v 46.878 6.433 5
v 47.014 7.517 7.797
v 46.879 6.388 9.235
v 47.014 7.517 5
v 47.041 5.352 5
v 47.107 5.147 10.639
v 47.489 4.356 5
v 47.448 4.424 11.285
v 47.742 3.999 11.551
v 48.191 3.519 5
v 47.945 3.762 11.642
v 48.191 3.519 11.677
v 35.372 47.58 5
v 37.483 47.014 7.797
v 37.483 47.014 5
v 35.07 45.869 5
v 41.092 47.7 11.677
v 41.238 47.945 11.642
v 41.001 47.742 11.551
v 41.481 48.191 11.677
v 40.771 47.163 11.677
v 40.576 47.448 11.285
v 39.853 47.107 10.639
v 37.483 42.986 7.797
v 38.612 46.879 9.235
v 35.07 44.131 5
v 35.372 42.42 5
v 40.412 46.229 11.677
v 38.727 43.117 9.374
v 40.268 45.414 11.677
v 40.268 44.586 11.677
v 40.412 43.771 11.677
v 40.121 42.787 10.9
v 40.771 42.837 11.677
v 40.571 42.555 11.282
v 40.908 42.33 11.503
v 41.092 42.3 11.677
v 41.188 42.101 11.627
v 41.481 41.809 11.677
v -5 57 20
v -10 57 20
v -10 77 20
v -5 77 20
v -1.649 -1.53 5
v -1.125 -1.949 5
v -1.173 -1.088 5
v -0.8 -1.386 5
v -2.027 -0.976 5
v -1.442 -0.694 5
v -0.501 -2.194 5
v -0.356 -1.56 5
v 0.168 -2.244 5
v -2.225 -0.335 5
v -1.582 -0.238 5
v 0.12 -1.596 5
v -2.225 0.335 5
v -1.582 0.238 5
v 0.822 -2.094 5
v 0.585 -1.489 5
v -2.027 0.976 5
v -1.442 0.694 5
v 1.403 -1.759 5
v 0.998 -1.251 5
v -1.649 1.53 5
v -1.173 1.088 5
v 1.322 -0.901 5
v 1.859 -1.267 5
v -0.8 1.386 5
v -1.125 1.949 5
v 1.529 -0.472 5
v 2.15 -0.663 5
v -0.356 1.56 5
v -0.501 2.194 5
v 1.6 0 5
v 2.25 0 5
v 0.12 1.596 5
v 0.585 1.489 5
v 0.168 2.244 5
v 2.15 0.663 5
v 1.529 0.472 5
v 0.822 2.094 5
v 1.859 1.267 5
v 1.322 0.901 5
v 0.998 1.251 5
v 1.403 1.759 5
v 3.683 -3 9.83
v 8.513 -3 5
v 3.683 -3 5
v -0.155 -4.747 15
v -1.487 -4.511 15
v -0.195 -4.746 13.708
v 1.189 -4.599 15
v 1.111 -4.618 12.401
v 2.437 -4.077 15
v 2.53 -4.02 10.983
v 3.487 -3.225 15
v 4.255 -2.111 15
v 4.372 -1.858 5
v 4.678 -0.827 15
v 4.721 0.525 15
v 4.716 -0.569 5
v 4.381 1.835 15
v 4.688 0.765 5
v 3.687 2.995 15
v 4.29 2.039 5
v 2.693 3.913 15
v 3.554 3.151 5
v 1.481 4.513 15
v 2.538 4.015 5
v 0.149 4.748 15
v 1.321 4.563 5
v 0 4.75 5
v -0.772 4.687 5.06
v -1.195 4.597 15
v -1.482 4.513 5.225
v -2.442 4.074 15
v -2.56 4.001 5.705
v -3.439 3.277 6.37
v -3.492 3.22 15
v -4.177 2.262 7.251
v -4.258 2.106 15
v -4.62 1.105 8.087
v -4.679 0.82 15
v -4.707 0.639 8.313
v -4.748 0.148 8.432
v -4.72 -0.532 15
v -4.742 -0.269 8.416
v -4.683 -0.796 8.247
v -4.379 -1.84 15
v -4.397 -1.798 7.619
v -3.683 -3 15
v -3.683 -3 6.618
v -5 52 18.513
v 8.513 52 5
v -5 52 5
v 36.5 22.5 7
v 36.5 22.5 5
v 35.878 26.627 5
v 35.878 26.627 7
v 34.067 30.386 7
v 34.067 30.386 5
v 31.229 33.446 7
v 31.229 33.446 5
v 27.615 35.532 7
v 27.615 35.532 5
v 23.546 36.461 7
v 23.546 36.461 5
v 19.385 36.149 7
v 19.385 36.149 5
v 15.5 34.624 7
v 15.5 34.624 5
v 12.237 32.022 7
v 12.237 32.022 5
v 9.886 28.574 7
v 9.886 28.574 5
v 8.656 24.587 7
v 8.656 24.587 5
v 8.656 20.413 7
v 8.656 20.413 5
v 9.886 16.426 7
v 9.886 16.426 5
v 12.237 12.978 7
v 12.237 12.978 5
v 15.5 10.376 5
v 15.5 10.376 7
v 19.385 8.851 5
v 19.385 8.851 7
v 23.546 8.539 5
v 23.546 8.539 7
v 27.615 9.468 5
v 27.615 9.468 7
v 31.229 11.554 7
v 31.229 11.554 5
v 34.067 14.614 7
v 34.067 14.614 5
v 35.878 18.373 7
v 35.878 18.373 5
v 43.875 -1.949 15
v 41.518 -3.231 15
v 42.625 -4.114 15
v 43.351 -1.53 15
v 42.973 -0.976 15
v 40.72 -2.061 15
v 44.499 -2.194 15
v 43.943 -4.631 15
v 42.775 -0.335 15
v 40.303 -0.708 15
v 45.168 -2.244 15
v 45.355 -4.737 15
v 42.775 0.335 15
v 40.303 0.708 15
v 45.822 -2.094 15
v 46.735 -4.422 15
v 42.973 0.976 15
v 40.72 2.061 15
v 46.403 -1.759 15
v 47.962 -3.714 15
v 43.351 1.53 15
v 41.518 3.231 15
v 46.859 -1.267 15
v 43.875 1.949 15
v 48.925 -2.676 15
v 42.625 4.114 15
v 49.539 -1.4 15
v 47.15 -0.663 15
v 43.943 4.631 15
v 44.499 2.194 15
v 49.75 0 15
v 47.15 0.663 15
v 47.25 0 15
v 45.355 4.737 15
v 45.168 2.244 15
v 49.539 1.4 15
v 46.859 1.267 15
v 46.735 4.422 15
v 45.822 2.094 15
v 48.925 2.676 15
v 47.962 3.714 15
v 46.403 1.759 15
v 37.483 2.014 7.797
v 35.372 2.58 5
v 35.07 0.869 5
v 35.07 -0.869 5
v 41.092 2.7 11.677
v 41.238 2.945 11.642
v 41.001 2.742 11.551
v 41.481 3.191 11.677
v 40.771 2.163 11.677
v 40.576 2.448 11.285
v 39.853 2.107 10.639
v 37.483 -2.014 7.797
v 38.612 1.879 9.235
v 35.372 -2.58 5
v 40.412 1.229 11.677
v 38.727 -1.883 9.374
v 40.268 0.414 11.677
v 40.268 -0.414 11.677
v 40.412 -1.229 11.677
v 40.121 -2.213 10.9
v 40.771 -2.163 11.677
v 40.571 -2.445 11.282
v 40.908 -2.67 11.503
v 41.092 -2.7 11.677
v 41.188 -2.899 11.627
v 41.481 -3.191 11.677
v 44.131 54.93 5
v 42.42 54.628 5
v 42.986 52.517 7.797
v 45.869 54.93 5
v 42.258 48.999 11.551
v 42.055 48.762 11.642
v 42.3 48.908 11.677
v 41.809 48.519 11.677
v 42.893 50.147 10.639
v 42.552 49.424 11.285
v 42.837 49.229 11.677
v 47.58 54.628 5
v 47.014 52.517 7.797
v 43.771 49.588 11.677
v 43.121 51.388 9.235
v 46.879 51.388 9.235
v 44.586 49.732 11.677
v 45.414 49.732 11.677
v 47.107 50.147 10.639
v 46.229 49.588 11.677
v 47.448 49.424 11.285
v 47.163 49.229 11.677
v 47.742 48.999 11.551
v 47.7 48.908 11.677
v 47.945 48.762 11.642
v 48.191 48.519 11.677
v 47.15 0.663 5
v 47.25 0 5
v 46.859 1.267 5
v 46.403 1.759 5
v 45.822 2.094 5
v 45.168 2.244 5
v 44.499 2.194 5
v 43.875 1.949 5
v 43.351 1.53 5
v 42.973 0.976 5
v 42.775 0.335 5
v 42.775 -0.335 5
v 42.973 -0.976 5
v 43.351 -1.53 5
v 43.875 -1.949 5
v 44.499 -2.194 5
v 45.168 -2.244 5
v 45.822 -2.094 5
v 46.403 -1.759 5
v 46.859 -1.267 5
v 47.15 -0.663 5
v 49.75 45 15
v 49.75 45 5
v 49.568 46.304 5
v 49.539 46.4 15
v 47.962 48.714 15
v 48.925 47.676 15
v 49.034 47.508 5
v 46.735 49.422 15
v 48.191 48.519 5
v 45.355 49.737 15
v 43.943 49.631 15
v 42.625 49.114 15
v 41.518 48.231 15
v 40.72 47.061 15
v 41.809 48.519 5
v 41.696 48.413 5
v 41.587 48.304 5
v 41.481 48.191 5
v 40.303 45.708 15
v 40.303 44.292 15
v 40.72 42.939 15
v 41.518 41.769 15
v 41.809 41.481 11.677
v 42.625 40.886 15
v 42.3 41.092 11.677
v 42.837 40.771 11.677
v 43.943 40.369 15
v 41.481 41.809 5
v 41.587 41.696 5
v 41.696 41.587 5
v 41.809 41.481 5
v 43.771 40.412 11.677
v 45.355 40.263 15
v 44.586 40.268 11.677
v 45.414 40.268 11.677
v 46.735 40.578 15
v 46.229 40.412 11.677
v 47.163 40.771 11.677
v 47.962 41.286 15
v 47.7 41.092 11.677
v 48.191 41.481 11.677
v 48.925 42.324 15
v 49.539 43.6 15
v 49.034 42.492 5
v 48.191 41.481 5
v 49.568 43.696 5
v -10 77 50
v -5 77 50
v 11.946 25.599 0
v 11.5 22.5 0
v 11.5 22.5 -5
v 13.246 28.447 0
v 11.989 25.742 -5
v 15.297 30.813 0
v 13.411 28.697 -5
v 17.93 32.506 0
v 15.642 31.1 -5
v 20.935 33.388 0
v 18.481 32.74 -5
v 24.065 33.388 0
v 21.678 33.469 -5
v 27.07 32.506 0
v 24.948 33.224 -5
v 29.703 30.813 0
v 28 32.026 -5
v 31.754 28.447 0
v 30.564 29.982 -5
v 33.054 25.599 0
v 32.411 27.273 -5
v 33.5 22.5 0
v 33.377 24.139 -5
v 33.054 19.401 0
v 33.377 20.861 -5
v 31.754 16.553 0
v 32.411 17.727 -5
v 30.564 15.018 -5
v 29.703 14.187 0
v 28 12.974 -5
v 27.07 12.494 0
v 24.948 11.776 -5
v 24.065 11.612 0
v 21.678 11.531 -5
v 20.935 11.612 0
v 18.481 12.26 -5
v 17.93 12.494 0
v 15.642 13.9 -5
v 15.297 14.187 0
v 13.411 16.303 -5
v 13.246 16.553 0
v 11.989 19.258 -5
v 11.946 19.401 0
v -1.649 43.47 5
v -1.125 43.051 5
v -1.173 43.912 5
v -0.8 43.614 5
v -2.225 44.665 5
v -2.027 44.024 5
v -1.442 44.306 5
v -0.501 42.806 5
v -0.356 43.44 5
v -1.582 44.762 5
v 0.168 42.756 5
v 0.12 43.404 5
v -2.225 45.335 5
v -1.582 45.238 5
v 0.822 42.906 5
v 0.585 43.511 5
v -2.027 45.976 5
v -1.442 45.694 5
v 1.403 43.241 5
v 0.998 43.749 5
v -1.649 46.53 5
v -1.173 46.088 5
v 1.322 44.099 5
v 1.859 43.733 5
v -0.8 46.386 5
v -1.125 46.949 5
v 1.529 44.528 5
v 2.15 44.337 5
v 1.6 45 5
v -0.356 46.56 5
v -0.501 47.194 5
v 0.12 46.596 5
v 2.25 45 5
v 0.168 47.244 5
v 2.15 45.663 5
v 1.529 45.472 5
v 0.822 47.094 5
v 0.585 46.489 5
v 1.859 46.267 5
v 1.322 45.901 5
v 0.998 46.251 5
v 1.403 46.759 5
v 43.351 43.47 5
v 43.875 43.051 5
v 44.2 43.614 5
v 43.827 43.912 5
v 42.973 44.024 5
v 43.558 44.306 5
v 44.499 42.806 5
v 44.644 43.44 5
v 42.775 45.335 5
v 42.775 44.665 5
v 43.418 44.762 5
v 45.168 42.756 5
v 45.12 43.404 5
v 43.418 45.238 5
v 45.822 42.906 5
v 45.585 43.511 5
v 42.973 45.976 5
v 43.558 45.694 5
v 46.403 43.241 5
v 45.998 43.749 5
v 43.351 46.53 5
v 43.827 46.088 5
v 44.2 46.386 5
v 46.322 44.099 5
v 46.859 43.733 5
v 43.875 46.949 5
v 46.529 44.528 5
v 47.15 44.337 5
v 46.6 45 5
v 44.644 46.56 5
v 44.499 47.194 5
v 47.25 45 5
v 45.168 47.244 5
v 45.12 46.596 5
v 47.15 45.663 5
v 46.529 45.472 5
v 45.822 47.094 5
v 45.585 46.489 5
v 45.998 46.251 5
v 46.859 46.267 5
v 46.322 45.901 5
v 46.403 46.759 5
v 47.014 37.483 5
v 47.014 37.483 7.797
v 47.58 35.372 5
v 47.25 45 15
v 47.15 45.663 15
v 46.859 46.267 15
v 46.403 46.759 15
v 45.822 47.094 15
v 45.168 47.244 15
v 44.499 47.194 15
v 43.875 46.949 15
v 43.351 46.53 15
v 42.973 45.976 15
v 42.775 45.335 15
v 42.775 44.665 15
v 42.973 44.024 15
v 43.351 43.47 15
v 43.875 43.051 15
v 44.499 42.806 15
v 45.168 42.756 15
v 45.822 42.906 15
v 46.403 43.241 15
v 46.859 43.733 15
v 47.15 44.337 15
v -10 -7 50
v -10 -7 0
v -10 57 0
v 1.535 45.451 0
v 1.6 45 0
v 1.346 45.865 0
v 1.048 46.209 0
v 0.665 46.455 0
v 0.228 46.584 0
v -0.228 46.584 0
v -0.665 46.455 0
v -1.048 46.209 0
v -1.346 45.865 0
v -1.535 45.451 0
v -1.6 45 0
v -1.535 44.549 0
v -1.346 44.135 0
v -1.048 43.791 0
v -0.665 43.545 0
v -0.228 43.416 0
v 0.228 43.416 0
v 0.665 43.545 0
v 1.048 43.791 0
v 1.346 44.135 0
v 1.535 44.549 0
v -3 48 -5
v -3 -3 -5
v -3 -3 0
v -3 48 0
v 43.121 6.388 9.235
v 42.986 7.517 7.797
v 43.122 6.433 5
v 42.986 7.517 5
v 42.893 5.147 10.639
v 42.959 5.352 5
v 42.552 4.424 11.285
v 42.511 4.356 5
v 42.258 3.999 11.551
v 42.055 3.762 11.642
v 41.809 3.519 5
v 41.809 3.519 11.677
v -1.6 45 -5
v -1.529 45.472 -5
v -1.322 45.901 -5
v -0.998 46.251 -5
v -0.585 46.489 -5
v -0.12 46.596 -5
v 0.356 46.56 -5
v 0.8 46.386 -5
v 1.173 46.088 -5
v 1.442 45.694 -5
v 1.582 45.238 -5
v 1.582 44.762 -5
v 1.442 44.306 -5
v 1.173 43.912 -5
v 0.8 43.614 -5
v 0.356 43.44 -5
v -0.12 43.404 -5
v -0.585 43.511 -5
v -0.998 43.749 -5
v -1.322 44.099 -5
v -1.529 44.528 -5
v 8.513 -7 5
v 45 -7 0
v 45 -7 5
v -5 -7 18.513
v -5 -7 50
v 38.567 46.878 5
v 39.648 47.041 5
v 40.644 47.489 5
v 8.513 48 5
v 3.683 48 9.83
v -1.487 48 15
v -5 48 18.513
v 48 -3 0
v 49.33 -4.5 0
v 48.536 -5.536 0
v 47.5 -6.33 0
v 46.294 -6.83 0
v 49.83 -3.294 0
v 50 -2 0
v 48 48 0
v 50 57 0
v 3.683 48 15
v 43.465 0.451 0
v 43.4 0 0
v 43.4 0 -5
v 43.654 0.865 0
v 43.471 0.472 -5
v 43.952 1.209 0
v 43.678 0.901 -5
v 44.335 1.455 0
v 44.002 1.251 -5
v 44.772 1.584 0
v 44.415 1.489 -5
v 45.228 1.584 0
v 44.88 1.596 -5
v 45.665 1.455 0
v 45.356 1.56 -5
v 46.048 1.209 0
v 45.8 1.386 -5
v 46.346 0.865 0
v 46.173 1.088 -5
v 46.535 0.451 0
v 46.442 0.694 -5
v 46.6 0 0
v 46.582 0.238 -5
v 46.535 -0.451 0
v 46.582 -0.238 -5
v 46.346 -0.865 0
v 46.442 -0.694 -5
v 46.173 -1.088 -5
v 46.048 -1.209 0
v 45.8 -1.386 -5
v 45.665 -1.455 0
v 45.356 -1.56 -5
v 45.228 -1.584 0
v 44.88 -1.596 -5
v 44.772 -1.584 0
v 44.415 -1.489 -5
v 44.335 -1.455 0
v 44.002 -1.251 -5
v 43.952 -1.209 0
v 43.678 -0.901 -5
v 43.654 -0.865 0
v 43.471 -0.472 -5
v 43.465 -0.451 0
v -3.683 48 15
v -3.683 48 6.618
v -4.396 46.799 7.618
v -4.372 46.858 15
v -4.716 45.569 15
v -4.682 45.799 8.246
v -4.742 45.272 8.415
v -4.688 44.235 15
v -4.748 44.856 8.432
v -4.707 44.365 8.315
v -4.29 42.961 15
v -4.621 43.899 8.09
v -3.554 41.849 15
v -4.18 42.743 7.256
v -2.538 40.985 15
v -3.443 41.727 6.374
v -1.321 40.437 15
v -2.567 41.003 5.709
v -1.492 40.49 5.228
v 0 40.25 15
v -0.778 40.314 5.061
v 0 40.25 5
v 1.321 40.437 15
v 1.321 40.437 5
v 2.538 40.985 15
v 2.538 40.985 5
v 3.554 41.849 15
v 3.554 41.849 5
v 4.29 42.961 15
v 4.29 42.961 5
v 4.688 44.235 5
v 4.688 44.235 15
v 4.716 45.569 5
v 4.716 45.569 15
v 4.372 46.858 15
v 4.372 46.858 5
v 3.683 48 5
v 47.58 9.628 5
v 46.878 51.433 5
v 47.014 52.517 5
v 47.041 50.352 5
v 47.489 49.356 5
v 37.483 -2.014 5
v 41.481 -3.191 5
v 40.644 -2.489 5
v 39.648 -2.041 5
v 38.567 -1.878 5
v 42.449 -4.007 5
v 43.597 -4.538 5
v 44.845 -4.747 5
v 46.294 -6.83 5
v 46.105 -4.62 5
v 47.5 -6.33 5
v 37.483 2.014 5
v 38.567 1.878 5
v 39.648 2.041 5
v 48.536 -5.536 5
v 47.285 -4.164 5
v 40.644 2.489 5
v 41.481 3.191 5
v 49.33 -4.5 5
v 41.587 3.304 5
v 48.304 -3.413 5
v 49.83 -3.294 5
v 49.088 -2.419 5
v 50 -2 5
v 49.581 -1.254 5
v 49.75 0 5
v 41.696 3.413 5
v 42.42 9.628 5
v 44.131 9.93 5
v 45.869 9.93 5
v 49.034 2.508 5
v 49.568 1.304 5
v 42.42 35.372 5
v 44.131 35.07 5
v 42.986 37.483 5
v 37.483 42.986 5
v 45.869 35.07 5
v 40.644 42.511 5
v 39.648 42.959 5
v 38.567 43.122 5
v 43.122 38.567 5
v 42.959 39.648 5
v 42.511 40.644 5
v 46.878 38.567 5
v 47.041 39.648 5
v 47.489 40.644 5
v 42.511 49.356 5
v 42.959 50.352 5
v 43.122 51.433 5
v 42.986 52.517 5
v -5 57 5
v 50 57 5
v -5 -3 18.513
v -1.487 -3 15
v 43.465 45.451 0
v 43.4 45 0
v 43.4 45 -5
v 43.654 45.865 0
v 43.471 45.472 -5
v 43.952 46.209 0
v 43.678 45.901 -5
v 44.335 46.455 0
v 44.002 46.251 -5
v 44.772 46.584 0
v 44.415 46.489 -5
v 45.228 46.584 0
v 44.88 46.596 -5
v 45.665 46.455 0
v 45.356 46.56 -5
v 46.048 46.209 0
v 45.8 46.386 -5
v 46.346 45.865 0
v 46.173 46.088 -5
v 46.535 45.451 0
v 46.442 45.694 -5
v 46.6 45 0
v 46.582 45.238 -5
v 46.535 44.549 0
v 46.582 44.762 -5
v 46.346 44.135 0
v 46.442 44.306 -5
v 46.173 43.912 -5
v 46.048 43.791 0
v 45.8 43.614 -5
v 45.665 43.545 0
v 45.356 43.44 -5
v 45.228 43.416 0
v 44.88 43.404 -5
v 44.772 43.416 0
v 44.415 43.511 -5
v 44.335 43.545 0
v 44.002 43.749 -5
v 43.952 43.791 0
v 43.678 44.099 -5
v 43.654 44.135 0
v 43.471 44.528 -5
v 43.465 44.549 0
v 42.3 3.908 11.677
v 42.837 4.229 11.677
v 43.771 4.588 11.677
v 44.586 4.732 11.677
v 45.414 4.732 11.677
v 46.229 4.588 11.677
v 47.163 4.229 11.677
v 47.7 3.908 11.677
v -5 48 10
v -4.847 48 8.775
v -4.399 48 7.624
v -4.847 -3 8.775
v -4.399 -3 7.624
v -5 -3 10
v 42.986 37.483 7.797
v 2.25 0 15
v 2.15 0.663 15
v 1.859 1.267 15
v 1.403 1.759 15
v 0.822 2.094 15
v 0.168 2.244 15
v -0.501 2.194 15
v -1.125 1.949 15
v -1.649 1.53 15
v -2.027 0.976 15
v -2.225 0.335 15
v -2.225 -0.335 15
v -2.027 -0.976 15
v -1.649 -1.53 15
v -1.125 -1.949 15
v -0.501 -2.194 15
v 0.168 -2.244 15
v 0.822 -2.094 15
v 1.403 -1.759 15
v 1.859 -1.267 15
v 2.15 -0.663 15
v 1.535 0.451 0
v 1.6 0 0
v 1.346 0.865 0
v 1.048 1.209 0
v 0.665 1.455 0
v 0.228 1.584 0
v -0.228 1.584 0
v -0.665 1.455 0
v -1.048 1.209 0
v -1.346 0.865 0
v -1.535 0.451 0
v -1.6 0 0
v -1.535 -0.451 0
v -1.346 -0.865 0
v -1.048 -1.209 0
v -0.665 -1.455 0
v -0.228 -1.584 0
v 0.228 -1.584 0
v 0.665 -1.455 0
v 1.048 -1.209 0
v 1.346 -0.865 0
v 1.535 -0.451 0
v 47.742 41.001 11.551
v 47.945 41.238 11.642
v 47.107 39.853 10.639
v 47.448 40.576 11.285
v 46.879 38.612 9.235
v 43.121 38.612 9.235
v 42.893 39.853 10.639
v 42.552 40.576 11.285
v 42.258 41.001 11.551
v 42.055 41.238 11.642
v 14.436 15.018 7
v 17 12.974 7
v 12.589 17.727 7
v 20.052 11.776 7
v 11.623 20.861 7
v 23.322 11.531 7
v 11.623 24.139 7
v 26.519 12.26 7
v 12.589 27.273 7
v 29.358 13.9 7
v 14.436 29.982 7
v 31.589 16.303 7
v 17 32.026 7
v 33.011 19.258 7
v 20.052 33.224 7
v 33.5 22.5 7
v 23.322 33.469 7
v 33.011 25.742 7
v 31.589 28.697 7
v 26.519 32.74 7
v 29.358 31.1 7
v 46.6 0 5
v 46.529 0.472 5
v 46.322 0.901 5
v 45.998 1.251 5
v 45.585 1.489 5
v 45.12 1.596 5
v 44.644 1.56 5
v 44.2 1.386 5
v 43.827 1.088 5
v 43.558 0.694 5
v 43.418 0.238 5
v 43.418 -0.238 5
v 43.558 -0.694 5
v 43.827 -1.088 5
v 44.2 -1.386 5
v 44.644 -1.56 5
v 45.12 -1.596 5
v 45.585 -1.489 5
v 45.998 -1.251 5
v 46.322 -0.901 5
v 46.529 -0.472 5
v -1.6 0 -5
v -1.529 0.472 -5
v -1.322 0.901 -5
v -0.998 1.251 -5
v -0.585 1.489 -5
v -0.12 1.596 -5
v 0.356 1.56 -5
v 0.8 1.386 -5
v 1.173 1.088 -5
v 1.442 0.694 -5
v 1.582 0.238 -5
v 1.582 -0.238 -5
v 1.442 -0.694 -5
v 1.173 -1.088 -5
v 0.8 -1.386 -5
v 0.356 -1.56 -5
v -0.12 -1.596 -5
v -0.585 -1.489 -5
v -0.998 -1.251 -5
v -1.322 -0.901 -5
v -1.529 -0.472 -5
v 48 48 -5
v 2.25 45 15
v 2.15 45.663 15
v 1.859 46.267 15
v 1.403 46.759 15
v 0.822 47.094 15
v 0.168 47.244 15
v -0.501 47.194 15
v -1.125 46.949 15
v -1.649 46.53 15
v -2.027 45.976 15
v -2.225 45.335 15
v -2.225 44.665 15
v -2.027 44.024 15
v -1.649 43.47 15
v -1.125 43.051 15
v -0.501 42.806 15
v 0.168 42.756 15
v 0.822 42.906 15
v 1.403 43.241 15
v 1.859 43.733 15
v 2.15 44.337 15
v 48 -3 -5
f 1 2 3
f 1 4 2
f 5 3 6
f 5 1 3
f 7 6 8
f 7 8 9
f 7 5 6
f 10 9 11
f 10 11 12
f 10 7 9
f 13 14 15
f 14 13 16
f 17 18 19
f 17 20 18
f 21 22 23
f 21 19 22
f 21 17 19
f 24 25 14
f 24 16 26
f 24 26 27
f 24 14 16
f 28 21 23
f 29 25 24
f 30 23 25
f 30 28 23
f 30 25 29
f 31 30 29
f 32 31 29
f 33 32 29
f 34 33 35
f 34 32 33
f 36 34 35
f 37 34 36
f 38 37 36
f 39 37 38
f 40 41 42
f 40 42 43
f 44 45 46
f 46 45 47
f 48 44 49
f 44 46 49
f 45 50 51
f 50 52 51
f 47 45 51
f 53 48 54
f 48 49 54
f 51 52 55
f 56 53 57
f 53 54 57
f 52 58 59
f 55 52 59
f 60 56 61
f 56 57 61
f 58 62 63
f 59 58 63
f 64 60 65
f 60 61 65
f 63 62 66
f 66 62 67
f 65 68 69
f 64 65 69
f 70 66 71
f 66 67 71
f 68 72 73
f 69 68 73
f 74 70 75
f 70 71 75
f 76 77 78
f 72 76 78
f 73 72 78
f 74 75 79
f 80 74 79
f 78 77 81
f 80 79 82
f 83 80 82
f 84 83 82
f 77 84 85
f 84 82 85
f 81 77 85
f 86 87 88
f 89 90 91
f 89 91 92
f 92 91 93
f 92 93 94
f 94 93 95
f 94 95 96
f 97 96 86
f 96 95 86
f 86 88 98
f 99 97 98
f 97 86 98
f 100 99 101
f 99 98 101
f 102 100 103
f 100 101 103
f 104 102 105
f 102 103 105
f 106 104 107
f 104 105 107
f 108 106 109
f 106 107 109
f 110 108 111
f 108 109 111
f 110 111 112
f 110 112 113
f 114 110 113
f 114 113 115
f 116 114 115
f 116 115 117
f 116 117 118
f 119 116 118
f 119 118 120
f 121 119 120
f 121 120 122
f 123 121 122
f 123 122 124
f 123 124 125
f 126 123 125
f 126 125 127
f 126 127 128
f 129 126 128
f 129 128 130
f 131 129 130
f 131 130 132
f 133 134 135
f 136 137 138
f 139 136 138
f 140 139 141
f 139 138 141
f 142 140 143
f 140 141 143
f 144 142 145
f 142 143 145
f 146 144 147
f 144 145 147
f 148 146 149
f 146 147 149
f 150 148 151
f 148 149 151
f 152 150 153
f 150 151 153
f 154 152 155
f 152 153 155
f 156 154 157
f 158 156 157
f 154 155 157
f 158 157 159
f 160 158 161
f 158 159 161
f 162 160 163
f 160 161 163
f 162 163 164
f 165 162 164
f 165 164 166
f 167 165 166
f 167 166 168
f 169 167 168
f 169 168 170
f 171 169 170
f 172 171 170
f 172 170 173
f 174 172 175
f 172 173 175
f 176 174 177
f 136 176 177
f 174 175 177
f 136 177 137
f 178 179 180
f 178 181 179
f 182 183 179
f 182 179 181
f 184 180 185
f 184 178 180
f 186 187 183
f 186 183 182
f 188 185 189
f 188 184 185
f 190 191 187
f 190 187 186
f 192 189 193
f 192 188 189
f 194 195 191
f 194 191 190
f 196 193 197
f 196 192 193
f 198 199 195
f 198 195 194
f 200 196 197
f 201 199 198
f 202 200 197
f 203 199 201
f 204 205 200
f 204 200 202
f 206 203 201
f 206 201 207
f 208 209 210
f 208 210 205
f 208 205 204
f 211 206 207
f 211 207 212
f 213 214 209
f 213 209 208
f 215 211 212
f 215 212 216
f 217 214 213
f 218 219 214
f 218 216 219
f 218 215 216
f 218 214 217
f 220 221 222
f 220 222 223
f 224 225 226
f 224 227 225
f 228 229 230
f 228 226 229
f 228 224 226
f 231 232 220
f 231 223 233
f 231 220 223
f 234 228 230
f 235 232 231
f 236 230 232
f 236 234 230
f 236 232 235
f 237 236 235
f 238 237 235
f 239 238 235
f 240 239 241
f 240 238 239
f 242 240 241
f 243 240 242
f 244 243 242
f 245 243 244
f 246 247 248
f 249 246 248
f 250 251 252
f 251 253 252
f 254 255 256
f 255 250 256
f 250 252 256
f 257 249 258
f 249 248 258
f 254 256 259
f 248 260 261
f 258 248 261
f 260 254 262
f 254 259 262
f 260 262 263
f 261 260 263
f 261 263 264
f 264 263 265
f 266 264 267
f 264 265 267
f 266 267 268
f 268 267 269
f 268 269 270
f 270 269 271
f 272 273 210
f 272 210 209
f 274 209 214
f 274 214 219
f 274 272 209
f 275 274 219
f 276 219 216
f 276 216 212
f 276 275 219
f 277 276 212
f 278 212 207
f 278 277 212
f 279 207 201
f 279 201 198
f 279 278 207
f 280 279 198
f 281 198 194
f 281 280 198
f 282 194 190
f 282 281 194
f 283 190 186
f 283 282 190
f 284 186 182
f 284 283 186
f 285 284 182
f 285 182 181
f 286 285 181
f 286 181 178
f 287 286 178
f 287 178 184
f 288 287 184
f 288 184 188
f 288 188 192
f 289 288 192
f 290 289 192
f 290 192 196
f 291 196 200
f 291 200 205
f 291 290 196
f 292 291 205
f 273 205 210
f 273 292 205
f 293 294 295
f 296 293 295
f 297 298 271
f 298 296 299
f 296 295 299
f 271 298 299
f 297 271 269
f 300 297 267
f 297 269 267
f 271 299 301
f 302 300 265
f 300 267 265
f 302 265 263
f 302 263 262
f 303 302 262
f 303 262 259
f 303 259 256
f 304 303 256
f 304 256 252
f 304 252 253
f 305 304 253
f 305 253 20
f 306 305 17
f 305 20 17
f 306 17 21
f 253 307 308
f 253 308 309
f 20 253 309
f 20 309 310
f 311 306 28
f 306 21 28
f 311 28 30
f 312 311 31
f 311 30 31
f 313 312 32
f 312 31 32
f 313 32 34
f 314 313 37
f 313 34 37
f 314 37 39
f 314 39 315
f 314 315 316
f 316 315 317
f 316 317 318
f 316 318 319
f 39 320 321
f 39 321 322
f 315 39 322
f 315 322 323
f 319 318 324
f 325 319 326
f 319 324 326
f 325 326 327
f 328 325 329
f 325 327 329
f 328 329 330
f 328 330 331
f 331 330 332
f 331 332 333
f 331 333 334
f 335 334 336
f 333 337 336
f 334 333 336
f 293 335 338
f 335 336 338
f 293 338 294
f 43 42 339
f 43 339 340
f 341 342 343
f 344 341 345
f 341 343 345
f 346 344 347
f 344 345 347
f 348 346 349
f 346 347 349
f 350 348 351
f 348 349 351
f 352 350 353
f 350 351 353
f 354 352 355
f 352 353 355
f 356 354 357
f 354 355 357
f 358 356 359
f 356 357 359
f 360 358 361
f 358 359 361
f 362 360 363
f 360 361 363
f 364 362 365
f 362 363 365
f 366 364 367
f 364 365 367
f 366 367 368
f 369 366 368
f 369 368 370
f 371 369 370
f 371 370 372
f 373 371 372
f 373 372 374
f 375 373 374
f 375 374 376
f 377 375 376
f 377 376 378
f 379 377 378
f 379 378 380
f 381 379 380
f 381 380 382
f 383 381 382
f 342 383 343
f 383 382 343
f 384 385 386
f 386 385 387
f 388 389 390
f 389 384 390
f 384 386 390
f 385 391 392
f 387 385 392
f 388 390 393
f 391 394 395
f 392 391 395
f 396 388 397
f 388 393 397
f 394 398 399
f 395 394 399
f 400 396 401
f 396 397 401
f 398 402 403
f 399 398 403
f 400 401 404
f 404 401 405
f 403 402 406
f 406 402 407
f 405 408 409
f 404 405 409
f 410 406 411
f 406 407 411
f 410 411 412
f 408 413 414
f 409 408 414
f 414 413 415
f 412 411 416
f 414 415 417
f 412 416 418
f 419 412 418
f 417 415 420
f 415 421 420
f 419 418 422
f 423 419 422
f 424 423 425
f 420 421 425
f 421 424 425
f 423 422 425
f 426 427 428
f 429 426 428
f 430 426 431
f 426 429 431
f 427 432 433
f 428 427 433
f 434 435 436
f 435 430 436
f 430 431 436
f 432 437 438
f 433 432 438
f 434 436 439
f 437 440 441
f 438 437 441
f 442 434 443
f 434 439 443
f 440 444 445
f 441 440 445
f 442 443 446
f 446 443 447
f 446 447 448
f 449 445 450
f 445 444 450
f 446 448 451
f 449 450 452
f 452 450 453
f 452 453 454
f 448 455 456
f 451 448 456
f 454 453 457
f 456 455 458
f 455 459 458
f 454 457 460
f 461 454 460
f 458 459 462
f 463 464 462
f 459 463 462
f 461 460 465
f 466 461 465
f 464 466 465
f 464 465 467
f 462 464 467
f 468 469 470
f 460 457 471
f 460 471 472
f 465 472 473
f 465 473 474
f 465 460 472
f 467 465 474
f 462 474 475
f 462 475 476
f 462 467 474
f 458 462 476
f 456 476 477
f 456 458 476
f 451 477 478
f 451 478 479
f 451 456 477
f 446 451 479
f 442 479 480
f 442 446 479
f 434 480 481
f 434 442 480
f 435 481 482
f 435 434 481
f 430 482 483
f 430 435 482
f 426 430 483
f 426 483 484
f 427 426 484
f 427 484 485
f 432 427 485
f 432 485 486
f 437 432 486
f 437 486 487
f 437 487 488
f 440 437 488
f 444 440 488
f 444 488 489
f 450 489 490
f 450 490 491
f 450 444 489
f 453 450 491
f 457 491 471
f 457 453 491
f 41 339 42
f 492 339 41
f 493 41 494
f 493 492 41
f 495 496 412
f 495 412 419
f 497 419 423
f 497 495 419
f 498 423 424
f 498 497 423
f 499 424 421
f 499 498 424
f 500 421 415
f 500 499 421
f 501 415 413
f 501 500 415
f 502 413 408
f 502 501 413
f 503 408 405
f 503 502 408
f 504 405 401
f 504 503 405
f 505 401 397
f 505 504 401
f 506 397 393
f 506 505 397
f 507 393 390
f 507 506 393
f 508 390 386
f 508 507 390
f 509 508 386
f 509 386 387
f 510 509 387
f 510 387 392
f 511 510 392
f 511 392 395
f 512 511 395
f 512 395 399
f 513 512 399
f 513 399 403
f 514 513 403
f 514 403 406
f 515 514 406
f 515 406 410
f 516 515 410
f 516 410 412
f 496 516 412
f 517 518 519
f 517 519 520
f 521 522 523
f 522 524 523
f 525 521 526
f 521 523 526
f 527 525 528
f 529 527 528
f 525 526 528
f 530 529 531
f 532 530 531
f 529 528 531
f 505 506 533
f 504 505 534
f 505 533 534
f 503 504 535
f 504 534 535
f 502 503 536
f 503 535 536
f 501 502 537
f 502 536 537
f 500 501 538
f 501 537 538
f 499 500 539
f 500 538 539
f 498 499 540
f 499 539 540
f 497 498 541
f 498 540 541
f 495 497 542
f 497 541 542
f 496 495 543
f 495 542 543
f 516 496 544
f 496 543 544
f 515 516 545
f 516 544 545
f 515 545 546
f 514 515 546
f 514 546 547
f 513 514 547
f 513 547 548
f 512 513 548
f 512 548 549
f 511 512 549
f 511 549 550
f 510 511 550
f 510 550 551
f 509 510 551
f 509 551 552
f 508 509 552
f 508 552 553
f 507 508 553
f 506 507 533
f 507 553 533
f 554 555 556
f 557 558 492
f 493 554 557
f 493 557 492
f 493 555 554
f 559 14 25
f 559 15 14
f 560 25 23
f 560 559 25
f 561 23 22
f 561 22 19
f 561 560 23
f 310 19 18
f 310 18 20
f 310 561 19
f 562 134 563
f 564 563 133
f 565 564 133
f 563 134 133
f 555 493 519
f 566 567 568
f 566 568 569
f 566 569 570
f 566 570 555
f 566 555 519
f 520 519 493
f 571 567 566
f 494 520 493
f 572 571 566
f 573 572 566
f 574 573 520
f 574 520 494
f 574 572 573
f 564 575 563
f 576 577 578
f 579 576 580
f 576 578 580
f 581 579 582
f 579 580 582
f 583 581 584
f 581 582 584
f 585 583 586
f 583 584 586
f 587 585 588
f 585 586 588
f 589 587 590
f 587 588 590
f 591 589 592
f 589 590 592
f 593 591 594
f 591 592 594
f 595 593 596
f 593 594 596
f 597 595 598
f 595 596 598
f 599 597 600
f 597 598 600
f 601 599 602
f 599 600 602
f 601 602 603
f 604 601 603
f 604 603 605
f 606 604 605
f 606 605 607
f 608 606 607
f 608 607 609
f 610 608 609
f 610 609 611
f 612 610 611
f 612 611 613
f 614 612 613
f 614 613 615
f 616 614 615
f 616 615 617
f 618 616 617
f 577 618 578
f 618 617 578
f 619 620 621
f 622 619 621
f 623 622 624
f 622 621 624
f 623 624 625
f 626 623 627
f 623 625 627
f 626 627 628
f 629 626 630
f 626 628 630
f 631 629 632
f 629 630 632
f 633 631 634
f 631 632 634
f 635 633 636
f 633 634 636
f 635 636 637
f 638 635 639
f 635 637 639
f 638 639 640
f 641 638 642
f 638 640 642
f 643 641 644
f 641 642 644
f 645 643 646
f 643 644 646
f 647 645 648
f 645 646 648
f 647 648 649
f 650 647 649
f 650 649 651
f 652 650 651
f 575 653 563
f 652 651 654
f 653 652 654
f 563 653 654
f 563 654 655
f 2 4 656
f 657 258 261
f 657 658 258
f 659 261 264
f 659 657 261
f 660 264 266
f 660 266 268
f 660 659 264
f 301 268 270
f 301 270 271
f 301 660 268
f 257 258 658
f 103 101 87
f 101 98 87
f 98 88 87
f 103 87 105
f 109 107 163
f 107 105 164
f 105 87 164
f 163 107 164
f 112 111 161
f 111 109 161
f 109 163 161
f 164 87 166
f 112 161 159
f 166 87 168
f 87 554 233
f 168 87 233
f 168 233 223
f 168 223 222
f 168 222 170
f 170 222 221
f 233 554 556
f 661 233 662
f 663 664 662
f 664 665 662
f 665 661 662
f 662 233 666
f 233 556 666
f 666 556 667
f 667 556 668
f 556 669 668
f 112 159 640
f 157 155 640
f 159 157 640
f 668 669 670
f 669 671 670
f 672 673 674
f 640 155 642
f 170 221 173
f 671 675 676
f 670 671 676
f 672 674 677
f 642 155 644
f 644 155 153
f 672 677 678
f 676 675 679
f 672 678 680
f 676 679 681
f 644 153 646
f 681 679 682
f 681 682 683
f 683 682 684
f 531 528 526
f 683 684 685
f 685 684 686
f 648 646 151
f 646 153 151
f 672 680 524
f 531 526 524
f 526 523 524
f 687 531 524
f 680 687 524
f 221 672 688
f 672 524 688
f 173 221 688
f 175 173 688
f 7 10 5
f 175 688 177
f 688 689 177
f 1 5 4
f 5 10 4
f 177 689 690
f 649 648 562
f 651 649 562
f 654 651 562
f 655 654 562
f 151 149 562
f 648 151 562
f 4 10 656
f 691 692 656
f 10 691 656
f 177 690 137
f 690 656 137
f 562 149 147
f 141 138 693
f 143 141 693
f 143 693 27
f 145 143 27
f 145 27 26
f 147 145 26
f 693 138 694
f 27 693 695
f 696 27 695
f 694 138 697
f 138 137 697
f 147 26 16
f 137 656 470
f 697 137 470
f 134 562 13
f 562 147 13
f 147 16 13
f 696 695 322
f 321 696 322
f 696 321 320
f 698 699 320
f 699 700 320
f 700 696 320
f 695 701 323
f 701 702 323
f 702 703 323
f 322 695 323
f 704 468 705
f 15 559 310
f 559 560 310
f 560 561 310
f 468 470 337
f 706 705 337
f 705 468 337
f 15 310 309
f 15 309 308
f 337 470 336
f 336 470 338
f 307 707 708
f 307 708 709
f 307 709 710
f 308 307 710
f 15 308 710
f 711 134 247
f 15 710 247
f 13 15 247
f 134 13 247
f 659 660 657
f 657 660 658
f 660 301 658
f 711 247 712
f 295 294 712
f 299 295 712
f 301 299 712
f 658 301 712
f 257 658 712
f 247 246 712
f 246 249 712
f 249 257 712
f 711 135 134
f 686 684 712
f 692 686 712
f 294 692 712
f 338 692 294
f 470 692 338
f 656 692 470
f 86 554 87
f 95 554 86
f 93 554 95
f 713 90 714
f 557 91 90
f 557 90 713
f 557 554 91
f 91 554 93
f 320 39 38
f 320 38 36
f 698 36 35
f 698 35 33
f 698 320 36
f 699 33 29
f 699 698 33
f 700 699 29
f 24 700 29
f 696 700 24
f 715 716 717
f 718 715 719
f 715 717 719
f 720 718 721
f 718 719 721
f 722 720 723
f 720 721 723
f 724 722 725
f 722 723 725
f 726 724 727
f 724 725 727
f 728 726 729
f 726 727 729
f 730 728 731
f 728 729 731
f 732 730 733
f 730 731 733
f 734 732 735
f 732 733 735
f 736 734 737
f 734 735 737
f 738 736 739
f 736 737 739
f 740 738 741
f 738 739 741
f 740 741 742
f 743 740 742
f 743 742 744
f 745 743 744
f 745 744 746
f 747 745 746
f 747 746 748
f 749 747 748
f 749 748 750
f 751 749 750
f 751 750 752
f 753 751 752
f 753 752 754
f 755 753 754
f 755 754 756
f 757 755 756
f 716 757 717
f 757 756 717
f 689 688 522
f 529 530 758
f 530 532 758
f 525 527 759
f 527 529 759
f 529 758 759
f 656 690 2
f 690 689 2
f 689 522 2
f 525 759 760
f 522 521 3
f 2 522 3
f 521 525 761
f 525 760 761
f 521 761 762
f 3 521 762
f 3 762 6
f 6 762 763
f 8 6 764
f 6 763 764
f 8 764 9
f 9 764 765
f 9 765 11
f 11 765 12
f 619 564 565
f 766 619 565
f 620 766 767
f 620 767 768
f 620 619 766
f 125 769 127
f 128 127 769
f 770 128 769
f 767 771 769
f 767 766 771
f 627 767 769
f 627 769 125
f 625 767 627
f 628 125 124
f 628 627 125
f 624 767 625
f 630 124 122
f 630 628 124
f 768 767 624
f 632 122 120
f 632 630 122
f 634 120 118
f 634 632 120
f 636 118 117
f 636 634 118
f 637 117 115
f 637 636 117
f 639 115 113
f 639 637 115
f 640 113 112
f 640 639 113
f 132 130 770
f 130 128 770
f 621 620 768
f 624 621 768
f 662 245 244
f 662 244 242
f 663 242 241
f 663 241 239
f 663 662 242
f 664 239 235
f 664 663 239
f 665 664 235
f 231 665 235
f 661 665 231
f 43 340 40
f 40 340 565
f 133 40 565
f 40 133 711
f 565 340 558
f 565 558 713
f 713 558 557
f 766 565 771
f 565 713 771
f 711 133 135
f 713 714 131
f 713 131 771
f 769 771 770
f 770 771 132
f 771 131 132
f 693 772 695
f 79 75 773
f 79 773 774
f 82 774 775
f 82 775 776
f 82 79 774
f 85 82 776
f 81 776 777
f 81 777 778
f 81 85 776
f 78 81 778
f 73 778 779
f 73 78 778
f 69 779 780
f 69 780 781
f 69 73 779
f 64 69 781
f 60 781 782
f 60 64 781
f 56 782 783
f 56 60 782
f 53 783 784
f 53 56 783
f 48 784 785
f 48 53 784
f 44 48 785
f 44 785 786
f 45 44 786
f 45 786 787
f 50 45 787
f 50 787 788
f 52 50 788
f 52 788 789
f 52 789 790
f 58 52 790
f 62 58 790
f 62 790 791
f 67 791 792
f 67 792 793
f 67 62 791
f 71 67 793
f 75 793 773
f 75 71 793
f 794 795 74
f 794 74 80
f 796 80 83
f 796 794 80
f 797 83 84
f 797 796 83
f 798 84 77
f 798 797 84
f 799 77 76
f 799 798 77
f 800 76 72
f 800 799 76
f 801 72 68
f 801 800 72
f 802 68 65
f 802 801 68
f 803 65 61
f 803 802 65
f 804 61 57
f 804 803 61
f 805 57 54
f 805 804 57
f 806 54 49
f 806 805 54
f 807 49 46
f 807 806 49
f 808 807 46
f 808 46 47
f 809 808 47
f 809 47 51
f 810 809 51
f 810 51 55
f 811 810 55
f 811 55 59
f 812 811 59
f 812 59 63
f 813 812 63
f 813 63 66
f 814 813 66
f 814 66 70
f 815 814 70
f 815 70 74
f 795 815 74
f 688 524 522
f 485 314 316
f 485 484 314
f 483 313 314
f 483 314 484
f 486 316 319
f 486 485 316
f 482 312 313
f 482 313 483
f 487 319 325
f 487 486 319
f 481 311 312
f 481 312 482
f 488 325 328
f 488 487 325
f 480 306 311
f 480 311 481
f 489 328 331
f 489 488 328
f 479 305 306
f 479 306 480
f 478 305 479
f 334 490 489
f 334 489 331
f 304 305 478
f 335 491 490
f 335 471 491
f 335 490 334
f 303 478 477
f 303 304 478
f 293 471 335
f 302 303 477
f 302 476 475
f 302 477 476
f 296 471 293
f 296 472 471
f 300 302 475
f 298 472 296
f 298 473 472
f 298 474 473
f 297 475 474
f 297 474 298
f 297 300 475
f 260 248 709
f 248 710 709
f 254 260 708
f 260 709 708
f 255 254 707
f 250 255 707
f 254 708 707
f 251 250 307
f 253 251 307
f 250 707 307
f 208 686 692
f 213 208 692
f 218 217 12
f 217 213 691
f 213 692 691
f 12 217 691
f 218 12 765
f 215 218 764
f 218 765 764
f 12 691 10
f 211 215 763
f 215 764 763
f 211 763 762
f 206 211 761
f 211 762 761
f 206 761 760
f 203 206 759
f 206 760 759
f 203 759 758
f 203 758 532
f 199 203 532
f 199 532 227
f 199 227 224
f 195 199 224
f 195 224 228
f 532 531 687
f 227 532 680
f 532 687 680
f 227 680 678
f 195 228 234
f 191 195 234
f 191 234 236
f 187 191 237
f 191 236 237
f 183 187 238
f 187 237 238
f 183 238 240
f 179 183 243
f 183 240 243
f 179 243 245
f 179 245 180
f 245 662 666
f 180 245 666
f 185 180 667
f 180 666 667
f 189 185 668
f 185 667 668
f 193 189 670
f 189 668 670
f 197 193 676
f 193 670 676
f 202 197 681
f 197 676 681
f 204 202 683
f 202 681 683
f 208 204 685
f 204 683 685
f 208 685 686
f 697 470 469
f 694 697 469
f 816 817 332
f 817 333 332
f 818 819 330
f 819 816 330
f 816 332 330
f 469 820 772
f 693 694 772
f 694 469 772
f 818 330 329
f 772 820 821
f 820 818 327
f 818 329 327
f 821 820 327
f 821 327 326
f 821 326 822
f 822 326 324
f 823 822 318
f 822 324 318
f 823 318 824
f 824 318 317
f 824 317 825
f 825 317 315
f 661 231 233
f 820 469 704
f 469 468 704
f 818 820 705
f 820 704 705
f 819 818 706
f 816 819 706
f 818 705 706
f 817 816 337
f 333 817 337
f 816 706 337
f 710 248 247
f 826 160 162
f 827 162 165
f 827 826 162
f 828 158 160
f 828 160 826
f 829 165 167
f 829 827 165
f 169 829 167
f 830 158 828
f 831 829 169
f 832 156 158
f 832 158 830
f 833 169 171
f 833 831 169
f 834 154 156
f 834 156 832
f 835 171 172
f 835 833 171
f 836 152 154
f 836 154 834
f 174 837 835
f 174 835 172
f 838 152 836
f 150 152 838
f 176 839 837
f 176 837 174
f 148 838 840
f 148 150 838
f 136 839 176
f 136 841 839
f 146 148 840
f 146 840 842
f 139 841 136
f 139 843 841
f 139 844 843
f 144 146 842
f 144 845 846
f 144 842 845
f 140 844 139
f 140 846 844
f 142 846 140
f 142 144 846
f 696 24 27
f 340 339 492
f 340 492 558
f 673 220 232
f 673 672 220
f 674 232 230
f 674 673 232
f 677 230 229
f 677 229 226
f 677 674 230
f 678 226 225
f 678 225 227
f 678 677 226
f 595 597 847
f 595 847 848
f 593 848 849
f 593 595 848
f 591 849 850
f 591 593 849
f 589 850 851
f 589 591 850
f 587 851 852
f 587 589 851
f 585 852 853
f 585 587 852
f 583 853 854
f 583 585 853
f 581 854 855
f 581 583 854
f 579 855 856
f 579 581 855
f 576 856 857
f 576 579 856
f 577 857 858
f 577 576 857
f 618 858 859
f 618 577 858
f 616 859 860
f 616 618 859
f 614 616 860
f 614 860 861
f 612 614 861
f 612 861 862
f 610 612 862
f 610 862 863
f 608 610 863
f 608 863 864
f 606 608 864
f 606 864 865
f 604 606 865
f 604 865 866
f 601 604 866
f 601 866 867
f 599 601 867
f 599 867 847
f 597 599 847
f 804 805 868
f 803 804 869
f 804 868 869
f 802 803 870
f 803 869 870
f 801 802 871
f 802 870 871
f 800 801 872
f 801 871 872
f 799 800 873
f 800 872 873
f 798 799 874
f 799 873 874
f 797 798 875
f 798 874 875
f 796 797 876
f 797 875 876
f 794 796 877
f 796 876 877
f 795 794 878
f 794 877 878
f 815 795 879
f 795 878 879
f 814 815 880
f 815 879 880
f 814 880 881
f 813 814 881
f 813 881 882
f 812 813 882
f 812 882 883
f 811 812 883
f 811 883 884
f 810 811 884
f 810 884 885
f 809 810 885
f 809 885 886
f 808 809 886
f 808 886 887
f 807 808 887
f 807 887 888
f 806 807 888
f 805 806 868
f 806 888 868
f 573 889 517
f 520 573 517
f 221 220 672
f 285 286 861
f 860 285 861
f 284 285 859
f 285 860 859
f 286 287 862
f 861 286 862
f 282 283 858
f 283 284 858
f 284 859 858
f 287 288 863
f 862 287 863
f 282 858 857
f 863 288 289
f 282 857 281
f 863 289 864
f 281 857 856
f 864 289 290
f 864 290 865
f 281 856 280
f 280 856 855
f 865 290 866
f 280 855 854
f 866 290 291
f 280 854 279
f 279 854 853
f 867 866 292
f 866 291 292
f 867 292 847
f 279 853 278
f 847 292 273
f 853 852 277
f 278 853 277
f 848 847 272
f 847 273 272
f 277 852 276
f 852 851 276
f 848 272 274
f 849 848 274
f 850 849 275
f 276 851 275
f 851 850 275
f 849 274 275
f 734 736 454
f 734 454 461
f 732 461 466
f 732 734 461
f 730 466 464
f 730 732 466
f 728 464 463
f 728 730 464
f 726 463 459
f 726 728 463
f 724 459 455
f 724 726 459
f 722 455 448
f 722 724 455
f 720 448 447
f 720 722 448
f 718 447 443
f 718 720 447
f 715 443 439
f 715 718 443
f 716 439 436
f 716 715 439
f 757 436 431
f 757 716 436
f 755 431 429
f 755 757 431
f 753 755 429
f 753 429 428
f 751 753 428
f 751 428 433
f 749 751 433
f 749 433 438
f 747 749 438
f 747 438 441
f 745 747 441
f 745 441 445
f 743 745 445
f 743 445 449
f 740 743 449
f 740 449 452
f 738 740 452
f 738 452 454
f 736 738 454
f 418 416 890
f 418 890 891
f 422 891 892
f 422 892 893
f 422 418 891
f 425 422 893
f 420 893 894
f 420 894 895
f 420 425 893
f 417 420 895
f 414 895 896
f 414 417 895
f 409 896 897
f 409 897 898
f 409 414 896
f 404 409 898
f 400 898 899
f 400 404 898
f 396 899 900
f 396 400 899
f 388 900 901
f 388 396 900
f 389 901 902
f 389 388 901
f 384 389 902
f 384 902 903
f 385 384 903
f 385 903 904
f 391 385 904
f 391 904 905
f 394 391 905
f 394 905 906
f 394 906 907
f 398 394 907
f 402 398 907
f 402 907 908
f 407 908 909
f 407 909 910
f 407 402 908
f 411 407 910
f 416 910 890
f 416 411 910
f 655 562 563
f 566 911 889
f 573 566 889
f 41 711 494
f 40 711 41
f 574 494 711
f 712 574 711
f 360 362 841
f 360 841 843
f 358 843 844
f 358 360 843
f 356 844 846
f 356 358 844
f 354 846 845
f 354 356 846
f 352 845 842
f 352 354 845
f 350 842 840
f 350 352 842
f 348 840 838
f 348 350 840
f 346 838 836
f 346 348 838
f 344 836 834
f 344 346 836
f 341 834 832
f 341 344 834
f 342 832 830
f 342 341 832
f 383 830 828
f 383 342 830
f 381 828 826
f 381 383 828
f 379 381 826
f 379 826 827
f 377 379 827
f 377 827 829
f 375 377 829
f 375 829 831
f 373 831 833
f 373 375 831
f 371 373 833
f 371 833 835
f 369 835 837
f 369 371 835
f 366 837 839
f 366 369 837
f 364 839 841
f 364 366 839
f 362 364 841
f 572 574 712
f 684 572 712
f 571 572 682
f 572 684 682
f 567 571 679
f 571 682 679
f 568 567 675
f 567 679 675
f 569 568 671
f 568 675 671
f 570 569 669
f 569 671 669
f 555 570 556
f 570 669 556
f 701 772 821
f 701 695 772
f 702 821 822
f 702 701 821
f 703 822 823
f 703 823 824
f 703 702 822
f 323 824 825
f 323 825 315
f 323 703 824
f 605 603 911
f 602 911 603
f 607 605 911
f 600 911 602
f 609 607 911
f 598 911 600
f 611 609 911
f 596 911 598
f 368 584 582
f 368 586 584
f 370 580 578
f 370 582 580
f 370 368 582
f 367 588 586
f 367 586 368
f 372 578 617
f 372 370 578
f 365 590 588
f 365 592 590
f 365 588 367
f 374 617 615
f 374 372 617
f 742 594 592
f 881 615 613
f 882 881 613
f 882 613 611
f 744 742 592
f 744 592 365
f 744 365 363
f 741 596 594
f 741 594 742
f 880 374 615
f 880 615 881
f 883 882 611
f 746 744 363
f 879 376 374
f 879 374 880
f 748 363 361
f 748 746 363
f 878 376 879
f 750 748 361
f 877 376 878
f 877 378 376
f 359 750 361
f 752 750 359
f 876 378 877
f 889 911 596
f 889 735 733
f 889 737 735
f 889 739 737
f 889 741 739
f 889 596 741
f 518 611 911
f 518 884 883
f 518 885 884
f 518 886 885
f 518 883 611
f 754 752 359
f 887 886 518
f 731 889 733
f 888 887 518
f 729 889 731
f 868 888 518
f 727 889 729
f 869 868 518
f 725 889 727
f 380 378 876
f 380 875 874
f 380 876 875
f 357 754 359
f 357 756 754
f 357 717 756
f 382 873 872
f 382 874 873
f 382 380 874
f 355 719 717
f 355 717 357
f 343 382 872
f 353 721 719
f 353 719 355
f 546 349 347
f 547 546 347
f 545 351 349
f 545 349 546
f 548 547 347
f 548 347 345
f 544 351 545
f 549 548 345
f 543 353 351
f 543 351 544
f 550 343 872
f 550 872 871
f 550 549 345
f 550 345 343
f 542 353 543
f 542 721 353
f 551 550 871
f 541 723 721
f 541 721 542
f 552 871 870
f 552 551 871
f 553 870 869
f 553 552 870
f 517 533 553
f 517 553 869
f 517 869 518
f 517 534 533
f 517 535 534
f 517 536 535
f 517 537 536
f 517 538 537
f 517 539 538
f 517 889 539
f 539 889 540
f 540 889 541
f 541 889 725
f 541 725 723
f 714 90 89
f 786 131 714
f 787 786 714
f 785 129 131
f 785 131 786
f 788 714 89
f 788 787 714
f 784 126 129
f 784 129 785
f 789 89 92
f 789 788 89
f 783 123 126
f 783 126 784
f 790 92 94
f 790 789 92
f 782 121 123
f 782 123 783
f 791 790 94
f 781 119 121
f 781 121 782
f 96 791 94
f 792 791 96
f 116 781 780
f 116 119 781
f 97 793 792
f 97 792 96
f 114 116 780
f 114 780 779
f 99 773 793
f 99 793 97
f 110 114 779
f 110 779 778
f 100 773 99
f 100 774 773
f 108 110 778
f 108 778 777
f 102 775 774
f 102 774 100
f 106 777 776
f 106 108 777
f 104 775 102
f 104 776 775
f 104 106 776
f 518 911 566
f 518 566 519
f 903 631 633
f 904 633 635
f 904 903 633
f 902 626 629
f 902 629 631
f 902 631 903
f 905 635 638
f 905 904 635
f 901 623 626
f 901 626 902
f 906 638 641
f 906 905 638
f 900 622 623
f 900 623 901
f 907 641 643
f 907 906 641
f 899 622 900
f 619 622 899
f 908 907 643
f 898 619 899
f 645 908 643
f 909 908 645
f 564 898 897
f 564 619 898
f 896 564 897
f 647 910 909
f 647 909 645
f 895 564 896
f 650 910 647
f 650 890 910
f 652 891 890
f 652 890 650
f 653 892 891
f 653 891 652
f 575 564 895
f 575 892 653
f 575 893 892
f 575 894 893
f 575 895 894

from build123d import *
from build123d.topology import SkipClean

# Parameters (mm, degrees)
SKETCH2_W            = 55
SKETCH2_H            = 59
SKETCH2_R            = 1.6
SKETCH2_R_2          = 11
BOSS_EXTRUDE1_DEPTH  = 5
SKETCH4_W            = 5
SKETCH4_H            = 59
BOSS_EXTRUDE2_DEPTH  = 50
BOSS_EXTRUDE3_DEPTH  = 4
FILLET2_R            = 5
SKETCH7_W            = 5
SKETCH7_H            = 50
BOSS_EXTRUDE4_DEPTH  = 5
BOSS_EXTRUDE5_START  = -60
SKETCH8_W            = 5
SKETCH8_H            = 5
BOSS_EXTRUDE5_DEPTH  = 55
SKETCH10_R           = 2.25
SKETCH10_R_2         = 4.75
BOSS_EXTRUDE6_DEPTH  = 10
REVOLVE1_ANGLE       = 30
CIRPATTERN1_COUNT    = 2
CIRPATTERN1_ANGLE    = 270
MIRROR1_COPY_1_ANGLE = 30
CIRPATTERN2_COUNT    = 2
CIRPATTERN2_ANGLE    = 270
SKETCH12_R           = 14
SKETCH12_R_2         = 11
BOSS_EXTRUDE7_DEPTH  = 2
FILLET3_R            = 4
SKETCH14_W           = 5
SKETCH14_H           = 30
BOSS_EXTRUDE8_DEPTH  = 20
FILLET4_R            = 5
BOSS_EXTRUDE9_START  = 5
SKETCH15_W           = 51
SKETCH15_H           = 51
SKETCH15_R           = 1.6
SKETCH15_R_2         = 11
BOSS_EXTRUDE9_DEPTH  = 5


with BuildPart() as part:
    # Sketch2 → Boss-Extrude1 (new body)
    with BuildSketch(Plane.XY):
        with Locations((22.5, 22.5)):
            Rectangle(SKETCH2_W, SKETCH2_H)
        with Locations((0, 45)):
            Circle(SKETCH2_R, mode=Mode.SUBTRACT)
        with Locations((45, 45)):
            Circle(SKETCH2_R, mode=Mode.SUBTRACT)
        with Locations((45, 0)):
            Circle(SKETCH2_R, mode=Mode.SUBTRACT)
        Circle(SKETCH2_R, mode=Mode.SUBTRACT)
        with Locations((22.5, 22.5)):
            Circle(SKETCH2_R_2, mode=Mode.SUBTRACT)
    extrude(amount=BOSS_EXTRUDE1_DEPTH)

    # Sketch4 → Boss-Extrude2 (add)
    with BuildSketch(Plane(origin=(0, 0, 0), x_dir=(-1, 0, 0), z_dir=(0, 0, -1))):
        with Locations((7.5, 22.5)):
            Rectangle(SKETCH4_W, SKETCH4_H)
    extrude(amount=-BOSS_EXTRUDE2_DEPTH)

    # Sketch5 → Boss-Extrude3 (add)
    with BuildSketch(Plane(origin=(0, 52, 0), x_dir=(1, 0, 0), z_dir=(0, 1, 0))):
        Polygon((-5, -5), (8.512790644, -5), (-5, -18.512790644), align=None)
    boss_extrude3 = extrude(amount=-BOSS_EXTRUDE3_DEPTH)

    # Fillet2
    fillet2_edges = [part.edges().sort_by_distance(p)[0] for p in [
        (50, -7, 2.5),
    ]]
    fillet(fillet2_edges, radius=FILLET2_R)

    # Sketch7 → Boss-Extrude4 (add)
    with BuildSketch(Plane(origin=(0, 52, 0), x_dir=(1, 0, 0), z_dir=(0, 1, 0))):
        with Locations((-7.5, -25)):
            Rectangle(SKETCH7_W, SKETCH7_H)
    extrude(amount=BOSS_EXTRUDE4_DEPTH)

    # Sketch8 → Boss-Extrude5 (add)
    with BuildSketch(Plane.ZY.offset(10).offset(BOSS_EXTRUDE5_START)):
        with Locations((2.5, 54.5)):
            Rectangle(SKETCH8_W, SKETCH8_H)
    extrude(amount=BOSS_EXTRUDE5_DEPTH)

    # Sketch10 → Boss-Extrude6 (add)
    # profile 1 of 4: a face of its own
    with BuildSketch(Plane.XY.offset(5)):
        with BuildLine():
            Line((3.682729966, 48), (-3.682729966, 48))
            ThreePointArc((-3.682729966, 48), (0, 40.25), (3.682729966, 48))
        make_face()
        with Locations((0, 45)):
            Circle(SKETCH10_R, mode=Mode.SUBTRACT)
    # profile 2 of 4: a face of its own
    with BuildSketch(Plane.XY.offset(5)):
        with Locations((45, 45)):
            Circle(SKETCH10_R_2)
        with Locations((45, 45)):
            Circle(SKETCH10_R, mode=Mode.SUBTRACT)
    # profile 3 of 4: a face of its own
    with BuildSketch(Plane.XY.offset(5)):
        with Locations((45, 0)):
            Circle(SKETCH10_R_2)
        with Locations((45, 0)):
            Circle(SKETCH10_R, mode=Mode.SUBTRACT)
    # profile 4 of 4: a face of its own
    with BuildSketch(Plane.XY.offset(5)):
        Circle(SKETCH10_R_2)
        Circle(SKETCH10_R, mode=Mode.SUBTRACT)
    extrude(amount=BOSS_EXTRUDE6_DEPTH)

    # Sketch11 → Revolve1 (revolve, symmetric)
    with BuildSketch(Plane(origin=(0, 45, 0), x_dir=(0, 0, -1), z_dir=(0, 1, 0))) as revolve1_sk:
        Polygon((-5, -40.25), (-5, -35.032167456), (-11.67737913, -40.25), align=None)
    revolve1 = revolve(axis=Axis((45, 45, 15), (0, 0, -1)), revolution_arc=REVOLVE1_ANGLE / 2)
    revolve1 = revolve1 + revolve(revolve1_sk.sketch, axis=Axis((45, 45, 15), (0, 0, 1)), revolution_arc=REVOLVE1_ANGLE / 2)

    # CirPattern1: Revolve1 ×2 about axis
    cirpattern1_axis = Axis((45, 45, 15), (0, 0, -1))
    for i in range(1, CIRPATTERN1_COUNT):
        add(revolve1.rotate(cirpattern1_axis, i * CIRPATTERN1_ANGLE / (CIRPATTERN1_COUNT - 1)))

    # Mirror1: Revolve1 across plane
    add(revolve1.mirror(Plane.ZX.offset(22.5)))

    # Mirror1 copy 1 sketch → Mirror1 copy 1 (revolve, symmetric)
    with BuildSketch(Plane(origin=(45, 45, 0), x_dir=(0, 0, -1), z_dir=(-1, 0, 0))) as mirror1_copy_1_sk:
        Polygon((-5, 40.25), (-5, 35.032167456), (-11.67737913, 40.25), align=None)
    revolve(axis=Axis((45, 0, 15), (0, 0, 1)), revolution_arc=MIRROR1_COPY_1_ANGLE / 2)
    revolve(mirror1_copy_1_sk.sketch, axis=Axis((45, 0, 15), (0, 0, -1)), revolution_arc=MIRROR1_COPY_1_ANGLE / 2)

    # CirPattern2: Revolve1 ×2 about axis
    cirpattern2_axis = Axis((45, 45, 15), (0, 0, 1))
    for i in range(1, CIRPATTERN2_COUNT):
        add(revolve1.rotate(cirpattern2_axis, i * CIRPATTERN2_ANGLE / (CIRPATTERN2_COUNT - 1)))

    # Sketch12 → Boss-Extrude7 (add)
    with BuildSketch(Plane.XY.offset(5)):
        with Locations((22.5, 22.5)):
            Circle(SKETCH12_R)
        with Locations((22.5, 22.5)):
            Circle(SKETCH12_R_2, mode=Mode.SUBTRACT)
    extrude(amount=BOSS_EXTRUDE7_DEPTH)

    # Mirror2: Boss-Extrude3 across plane
    add(boss_extrude3.mirror(Plane.ZX.offset(22.5)))

    # Fillet3
    fillet3_edges = [part.edges().sort_by_distance(p)[0] for p in [
        (40.411852325, 43.770609536, 8.338689565),
        (40.411852325, 46.229390464, 8.338689565),
        (46.229390464, 40.411852325, 8.338689565),
        (43.770609536, 40.411852325, 8.338689565),
        (40.411852325, -1.229390464, 8.338689565),
        (40.411852325, 1.229390464, 8.338689565),
        (43.770609536, 4.588147675, 8.338689565),
        (46.229390464, 4.588147675, 8.338689565),
        (43.770609536, 49.588147675, 8.338689565),
        (46.229390464, 49.588147675, 8.338689565),
    ]]
    fillet(fillet3_edges, radius=FILLET3_R)

    # Sketch14 → Boss-Extrude8 (add)
    with BuildSketch(Plane(origin=(0, 57, 0), x_dir=(1, 0, 0), z_dir=(0, 1, 0))):
        with Locations((-7.5, -35)):
            Rectangle(SKETCH14_W, SKETCH14_H)
    extrude(amount=BOSS_EXTRUDE8_DEPTH)

    # Fillet4
    fillet4_edges = [part.edges().sort_by_distance(p)[0] for p in [
        (-5, 22.5, 5),
    ]]
    fillet(fillet4_edges, radius=FILLET4_R)

    # Sketch15 → Boss-Extrude9 (add)
    with SkipClean():  # the faces are left unmerged after this step: merging them gives an invalid solid
        with BuildSketch(Plane(origin=(0, 0, 0), x_dir=(-1, 0, 0), z_dir=(0, 0, -1)).offset(BOSS_EXTRUDE9_START)):
            with Locations((-22.5, 22.5)):
                Rectangle(SKETCH15_W, SKETCH15_H)
            Circle(SKETCH15_R, mode=Mode.SUBTRACT)
            with Locations((0, 45)):
                Circle(SKETCH15_R, mode=Mode.SUBTRACT)
            with Locations((-45, 45)):
                Circle(SKETCH15_R, mode=Mode.SUBTRACT)
            with Locations((-45, 0)):
                Circle(SKETCH15_R, mode=Mode.SUBTRACT)
            with Locations((-22.5, 22.5)):
                Circle(SKETCH15_R_2, mode=Mode.SUBTRACT)
        extrude(amount=-BOSS_EXTRUDE9_DEPTH)


solid = part.part
